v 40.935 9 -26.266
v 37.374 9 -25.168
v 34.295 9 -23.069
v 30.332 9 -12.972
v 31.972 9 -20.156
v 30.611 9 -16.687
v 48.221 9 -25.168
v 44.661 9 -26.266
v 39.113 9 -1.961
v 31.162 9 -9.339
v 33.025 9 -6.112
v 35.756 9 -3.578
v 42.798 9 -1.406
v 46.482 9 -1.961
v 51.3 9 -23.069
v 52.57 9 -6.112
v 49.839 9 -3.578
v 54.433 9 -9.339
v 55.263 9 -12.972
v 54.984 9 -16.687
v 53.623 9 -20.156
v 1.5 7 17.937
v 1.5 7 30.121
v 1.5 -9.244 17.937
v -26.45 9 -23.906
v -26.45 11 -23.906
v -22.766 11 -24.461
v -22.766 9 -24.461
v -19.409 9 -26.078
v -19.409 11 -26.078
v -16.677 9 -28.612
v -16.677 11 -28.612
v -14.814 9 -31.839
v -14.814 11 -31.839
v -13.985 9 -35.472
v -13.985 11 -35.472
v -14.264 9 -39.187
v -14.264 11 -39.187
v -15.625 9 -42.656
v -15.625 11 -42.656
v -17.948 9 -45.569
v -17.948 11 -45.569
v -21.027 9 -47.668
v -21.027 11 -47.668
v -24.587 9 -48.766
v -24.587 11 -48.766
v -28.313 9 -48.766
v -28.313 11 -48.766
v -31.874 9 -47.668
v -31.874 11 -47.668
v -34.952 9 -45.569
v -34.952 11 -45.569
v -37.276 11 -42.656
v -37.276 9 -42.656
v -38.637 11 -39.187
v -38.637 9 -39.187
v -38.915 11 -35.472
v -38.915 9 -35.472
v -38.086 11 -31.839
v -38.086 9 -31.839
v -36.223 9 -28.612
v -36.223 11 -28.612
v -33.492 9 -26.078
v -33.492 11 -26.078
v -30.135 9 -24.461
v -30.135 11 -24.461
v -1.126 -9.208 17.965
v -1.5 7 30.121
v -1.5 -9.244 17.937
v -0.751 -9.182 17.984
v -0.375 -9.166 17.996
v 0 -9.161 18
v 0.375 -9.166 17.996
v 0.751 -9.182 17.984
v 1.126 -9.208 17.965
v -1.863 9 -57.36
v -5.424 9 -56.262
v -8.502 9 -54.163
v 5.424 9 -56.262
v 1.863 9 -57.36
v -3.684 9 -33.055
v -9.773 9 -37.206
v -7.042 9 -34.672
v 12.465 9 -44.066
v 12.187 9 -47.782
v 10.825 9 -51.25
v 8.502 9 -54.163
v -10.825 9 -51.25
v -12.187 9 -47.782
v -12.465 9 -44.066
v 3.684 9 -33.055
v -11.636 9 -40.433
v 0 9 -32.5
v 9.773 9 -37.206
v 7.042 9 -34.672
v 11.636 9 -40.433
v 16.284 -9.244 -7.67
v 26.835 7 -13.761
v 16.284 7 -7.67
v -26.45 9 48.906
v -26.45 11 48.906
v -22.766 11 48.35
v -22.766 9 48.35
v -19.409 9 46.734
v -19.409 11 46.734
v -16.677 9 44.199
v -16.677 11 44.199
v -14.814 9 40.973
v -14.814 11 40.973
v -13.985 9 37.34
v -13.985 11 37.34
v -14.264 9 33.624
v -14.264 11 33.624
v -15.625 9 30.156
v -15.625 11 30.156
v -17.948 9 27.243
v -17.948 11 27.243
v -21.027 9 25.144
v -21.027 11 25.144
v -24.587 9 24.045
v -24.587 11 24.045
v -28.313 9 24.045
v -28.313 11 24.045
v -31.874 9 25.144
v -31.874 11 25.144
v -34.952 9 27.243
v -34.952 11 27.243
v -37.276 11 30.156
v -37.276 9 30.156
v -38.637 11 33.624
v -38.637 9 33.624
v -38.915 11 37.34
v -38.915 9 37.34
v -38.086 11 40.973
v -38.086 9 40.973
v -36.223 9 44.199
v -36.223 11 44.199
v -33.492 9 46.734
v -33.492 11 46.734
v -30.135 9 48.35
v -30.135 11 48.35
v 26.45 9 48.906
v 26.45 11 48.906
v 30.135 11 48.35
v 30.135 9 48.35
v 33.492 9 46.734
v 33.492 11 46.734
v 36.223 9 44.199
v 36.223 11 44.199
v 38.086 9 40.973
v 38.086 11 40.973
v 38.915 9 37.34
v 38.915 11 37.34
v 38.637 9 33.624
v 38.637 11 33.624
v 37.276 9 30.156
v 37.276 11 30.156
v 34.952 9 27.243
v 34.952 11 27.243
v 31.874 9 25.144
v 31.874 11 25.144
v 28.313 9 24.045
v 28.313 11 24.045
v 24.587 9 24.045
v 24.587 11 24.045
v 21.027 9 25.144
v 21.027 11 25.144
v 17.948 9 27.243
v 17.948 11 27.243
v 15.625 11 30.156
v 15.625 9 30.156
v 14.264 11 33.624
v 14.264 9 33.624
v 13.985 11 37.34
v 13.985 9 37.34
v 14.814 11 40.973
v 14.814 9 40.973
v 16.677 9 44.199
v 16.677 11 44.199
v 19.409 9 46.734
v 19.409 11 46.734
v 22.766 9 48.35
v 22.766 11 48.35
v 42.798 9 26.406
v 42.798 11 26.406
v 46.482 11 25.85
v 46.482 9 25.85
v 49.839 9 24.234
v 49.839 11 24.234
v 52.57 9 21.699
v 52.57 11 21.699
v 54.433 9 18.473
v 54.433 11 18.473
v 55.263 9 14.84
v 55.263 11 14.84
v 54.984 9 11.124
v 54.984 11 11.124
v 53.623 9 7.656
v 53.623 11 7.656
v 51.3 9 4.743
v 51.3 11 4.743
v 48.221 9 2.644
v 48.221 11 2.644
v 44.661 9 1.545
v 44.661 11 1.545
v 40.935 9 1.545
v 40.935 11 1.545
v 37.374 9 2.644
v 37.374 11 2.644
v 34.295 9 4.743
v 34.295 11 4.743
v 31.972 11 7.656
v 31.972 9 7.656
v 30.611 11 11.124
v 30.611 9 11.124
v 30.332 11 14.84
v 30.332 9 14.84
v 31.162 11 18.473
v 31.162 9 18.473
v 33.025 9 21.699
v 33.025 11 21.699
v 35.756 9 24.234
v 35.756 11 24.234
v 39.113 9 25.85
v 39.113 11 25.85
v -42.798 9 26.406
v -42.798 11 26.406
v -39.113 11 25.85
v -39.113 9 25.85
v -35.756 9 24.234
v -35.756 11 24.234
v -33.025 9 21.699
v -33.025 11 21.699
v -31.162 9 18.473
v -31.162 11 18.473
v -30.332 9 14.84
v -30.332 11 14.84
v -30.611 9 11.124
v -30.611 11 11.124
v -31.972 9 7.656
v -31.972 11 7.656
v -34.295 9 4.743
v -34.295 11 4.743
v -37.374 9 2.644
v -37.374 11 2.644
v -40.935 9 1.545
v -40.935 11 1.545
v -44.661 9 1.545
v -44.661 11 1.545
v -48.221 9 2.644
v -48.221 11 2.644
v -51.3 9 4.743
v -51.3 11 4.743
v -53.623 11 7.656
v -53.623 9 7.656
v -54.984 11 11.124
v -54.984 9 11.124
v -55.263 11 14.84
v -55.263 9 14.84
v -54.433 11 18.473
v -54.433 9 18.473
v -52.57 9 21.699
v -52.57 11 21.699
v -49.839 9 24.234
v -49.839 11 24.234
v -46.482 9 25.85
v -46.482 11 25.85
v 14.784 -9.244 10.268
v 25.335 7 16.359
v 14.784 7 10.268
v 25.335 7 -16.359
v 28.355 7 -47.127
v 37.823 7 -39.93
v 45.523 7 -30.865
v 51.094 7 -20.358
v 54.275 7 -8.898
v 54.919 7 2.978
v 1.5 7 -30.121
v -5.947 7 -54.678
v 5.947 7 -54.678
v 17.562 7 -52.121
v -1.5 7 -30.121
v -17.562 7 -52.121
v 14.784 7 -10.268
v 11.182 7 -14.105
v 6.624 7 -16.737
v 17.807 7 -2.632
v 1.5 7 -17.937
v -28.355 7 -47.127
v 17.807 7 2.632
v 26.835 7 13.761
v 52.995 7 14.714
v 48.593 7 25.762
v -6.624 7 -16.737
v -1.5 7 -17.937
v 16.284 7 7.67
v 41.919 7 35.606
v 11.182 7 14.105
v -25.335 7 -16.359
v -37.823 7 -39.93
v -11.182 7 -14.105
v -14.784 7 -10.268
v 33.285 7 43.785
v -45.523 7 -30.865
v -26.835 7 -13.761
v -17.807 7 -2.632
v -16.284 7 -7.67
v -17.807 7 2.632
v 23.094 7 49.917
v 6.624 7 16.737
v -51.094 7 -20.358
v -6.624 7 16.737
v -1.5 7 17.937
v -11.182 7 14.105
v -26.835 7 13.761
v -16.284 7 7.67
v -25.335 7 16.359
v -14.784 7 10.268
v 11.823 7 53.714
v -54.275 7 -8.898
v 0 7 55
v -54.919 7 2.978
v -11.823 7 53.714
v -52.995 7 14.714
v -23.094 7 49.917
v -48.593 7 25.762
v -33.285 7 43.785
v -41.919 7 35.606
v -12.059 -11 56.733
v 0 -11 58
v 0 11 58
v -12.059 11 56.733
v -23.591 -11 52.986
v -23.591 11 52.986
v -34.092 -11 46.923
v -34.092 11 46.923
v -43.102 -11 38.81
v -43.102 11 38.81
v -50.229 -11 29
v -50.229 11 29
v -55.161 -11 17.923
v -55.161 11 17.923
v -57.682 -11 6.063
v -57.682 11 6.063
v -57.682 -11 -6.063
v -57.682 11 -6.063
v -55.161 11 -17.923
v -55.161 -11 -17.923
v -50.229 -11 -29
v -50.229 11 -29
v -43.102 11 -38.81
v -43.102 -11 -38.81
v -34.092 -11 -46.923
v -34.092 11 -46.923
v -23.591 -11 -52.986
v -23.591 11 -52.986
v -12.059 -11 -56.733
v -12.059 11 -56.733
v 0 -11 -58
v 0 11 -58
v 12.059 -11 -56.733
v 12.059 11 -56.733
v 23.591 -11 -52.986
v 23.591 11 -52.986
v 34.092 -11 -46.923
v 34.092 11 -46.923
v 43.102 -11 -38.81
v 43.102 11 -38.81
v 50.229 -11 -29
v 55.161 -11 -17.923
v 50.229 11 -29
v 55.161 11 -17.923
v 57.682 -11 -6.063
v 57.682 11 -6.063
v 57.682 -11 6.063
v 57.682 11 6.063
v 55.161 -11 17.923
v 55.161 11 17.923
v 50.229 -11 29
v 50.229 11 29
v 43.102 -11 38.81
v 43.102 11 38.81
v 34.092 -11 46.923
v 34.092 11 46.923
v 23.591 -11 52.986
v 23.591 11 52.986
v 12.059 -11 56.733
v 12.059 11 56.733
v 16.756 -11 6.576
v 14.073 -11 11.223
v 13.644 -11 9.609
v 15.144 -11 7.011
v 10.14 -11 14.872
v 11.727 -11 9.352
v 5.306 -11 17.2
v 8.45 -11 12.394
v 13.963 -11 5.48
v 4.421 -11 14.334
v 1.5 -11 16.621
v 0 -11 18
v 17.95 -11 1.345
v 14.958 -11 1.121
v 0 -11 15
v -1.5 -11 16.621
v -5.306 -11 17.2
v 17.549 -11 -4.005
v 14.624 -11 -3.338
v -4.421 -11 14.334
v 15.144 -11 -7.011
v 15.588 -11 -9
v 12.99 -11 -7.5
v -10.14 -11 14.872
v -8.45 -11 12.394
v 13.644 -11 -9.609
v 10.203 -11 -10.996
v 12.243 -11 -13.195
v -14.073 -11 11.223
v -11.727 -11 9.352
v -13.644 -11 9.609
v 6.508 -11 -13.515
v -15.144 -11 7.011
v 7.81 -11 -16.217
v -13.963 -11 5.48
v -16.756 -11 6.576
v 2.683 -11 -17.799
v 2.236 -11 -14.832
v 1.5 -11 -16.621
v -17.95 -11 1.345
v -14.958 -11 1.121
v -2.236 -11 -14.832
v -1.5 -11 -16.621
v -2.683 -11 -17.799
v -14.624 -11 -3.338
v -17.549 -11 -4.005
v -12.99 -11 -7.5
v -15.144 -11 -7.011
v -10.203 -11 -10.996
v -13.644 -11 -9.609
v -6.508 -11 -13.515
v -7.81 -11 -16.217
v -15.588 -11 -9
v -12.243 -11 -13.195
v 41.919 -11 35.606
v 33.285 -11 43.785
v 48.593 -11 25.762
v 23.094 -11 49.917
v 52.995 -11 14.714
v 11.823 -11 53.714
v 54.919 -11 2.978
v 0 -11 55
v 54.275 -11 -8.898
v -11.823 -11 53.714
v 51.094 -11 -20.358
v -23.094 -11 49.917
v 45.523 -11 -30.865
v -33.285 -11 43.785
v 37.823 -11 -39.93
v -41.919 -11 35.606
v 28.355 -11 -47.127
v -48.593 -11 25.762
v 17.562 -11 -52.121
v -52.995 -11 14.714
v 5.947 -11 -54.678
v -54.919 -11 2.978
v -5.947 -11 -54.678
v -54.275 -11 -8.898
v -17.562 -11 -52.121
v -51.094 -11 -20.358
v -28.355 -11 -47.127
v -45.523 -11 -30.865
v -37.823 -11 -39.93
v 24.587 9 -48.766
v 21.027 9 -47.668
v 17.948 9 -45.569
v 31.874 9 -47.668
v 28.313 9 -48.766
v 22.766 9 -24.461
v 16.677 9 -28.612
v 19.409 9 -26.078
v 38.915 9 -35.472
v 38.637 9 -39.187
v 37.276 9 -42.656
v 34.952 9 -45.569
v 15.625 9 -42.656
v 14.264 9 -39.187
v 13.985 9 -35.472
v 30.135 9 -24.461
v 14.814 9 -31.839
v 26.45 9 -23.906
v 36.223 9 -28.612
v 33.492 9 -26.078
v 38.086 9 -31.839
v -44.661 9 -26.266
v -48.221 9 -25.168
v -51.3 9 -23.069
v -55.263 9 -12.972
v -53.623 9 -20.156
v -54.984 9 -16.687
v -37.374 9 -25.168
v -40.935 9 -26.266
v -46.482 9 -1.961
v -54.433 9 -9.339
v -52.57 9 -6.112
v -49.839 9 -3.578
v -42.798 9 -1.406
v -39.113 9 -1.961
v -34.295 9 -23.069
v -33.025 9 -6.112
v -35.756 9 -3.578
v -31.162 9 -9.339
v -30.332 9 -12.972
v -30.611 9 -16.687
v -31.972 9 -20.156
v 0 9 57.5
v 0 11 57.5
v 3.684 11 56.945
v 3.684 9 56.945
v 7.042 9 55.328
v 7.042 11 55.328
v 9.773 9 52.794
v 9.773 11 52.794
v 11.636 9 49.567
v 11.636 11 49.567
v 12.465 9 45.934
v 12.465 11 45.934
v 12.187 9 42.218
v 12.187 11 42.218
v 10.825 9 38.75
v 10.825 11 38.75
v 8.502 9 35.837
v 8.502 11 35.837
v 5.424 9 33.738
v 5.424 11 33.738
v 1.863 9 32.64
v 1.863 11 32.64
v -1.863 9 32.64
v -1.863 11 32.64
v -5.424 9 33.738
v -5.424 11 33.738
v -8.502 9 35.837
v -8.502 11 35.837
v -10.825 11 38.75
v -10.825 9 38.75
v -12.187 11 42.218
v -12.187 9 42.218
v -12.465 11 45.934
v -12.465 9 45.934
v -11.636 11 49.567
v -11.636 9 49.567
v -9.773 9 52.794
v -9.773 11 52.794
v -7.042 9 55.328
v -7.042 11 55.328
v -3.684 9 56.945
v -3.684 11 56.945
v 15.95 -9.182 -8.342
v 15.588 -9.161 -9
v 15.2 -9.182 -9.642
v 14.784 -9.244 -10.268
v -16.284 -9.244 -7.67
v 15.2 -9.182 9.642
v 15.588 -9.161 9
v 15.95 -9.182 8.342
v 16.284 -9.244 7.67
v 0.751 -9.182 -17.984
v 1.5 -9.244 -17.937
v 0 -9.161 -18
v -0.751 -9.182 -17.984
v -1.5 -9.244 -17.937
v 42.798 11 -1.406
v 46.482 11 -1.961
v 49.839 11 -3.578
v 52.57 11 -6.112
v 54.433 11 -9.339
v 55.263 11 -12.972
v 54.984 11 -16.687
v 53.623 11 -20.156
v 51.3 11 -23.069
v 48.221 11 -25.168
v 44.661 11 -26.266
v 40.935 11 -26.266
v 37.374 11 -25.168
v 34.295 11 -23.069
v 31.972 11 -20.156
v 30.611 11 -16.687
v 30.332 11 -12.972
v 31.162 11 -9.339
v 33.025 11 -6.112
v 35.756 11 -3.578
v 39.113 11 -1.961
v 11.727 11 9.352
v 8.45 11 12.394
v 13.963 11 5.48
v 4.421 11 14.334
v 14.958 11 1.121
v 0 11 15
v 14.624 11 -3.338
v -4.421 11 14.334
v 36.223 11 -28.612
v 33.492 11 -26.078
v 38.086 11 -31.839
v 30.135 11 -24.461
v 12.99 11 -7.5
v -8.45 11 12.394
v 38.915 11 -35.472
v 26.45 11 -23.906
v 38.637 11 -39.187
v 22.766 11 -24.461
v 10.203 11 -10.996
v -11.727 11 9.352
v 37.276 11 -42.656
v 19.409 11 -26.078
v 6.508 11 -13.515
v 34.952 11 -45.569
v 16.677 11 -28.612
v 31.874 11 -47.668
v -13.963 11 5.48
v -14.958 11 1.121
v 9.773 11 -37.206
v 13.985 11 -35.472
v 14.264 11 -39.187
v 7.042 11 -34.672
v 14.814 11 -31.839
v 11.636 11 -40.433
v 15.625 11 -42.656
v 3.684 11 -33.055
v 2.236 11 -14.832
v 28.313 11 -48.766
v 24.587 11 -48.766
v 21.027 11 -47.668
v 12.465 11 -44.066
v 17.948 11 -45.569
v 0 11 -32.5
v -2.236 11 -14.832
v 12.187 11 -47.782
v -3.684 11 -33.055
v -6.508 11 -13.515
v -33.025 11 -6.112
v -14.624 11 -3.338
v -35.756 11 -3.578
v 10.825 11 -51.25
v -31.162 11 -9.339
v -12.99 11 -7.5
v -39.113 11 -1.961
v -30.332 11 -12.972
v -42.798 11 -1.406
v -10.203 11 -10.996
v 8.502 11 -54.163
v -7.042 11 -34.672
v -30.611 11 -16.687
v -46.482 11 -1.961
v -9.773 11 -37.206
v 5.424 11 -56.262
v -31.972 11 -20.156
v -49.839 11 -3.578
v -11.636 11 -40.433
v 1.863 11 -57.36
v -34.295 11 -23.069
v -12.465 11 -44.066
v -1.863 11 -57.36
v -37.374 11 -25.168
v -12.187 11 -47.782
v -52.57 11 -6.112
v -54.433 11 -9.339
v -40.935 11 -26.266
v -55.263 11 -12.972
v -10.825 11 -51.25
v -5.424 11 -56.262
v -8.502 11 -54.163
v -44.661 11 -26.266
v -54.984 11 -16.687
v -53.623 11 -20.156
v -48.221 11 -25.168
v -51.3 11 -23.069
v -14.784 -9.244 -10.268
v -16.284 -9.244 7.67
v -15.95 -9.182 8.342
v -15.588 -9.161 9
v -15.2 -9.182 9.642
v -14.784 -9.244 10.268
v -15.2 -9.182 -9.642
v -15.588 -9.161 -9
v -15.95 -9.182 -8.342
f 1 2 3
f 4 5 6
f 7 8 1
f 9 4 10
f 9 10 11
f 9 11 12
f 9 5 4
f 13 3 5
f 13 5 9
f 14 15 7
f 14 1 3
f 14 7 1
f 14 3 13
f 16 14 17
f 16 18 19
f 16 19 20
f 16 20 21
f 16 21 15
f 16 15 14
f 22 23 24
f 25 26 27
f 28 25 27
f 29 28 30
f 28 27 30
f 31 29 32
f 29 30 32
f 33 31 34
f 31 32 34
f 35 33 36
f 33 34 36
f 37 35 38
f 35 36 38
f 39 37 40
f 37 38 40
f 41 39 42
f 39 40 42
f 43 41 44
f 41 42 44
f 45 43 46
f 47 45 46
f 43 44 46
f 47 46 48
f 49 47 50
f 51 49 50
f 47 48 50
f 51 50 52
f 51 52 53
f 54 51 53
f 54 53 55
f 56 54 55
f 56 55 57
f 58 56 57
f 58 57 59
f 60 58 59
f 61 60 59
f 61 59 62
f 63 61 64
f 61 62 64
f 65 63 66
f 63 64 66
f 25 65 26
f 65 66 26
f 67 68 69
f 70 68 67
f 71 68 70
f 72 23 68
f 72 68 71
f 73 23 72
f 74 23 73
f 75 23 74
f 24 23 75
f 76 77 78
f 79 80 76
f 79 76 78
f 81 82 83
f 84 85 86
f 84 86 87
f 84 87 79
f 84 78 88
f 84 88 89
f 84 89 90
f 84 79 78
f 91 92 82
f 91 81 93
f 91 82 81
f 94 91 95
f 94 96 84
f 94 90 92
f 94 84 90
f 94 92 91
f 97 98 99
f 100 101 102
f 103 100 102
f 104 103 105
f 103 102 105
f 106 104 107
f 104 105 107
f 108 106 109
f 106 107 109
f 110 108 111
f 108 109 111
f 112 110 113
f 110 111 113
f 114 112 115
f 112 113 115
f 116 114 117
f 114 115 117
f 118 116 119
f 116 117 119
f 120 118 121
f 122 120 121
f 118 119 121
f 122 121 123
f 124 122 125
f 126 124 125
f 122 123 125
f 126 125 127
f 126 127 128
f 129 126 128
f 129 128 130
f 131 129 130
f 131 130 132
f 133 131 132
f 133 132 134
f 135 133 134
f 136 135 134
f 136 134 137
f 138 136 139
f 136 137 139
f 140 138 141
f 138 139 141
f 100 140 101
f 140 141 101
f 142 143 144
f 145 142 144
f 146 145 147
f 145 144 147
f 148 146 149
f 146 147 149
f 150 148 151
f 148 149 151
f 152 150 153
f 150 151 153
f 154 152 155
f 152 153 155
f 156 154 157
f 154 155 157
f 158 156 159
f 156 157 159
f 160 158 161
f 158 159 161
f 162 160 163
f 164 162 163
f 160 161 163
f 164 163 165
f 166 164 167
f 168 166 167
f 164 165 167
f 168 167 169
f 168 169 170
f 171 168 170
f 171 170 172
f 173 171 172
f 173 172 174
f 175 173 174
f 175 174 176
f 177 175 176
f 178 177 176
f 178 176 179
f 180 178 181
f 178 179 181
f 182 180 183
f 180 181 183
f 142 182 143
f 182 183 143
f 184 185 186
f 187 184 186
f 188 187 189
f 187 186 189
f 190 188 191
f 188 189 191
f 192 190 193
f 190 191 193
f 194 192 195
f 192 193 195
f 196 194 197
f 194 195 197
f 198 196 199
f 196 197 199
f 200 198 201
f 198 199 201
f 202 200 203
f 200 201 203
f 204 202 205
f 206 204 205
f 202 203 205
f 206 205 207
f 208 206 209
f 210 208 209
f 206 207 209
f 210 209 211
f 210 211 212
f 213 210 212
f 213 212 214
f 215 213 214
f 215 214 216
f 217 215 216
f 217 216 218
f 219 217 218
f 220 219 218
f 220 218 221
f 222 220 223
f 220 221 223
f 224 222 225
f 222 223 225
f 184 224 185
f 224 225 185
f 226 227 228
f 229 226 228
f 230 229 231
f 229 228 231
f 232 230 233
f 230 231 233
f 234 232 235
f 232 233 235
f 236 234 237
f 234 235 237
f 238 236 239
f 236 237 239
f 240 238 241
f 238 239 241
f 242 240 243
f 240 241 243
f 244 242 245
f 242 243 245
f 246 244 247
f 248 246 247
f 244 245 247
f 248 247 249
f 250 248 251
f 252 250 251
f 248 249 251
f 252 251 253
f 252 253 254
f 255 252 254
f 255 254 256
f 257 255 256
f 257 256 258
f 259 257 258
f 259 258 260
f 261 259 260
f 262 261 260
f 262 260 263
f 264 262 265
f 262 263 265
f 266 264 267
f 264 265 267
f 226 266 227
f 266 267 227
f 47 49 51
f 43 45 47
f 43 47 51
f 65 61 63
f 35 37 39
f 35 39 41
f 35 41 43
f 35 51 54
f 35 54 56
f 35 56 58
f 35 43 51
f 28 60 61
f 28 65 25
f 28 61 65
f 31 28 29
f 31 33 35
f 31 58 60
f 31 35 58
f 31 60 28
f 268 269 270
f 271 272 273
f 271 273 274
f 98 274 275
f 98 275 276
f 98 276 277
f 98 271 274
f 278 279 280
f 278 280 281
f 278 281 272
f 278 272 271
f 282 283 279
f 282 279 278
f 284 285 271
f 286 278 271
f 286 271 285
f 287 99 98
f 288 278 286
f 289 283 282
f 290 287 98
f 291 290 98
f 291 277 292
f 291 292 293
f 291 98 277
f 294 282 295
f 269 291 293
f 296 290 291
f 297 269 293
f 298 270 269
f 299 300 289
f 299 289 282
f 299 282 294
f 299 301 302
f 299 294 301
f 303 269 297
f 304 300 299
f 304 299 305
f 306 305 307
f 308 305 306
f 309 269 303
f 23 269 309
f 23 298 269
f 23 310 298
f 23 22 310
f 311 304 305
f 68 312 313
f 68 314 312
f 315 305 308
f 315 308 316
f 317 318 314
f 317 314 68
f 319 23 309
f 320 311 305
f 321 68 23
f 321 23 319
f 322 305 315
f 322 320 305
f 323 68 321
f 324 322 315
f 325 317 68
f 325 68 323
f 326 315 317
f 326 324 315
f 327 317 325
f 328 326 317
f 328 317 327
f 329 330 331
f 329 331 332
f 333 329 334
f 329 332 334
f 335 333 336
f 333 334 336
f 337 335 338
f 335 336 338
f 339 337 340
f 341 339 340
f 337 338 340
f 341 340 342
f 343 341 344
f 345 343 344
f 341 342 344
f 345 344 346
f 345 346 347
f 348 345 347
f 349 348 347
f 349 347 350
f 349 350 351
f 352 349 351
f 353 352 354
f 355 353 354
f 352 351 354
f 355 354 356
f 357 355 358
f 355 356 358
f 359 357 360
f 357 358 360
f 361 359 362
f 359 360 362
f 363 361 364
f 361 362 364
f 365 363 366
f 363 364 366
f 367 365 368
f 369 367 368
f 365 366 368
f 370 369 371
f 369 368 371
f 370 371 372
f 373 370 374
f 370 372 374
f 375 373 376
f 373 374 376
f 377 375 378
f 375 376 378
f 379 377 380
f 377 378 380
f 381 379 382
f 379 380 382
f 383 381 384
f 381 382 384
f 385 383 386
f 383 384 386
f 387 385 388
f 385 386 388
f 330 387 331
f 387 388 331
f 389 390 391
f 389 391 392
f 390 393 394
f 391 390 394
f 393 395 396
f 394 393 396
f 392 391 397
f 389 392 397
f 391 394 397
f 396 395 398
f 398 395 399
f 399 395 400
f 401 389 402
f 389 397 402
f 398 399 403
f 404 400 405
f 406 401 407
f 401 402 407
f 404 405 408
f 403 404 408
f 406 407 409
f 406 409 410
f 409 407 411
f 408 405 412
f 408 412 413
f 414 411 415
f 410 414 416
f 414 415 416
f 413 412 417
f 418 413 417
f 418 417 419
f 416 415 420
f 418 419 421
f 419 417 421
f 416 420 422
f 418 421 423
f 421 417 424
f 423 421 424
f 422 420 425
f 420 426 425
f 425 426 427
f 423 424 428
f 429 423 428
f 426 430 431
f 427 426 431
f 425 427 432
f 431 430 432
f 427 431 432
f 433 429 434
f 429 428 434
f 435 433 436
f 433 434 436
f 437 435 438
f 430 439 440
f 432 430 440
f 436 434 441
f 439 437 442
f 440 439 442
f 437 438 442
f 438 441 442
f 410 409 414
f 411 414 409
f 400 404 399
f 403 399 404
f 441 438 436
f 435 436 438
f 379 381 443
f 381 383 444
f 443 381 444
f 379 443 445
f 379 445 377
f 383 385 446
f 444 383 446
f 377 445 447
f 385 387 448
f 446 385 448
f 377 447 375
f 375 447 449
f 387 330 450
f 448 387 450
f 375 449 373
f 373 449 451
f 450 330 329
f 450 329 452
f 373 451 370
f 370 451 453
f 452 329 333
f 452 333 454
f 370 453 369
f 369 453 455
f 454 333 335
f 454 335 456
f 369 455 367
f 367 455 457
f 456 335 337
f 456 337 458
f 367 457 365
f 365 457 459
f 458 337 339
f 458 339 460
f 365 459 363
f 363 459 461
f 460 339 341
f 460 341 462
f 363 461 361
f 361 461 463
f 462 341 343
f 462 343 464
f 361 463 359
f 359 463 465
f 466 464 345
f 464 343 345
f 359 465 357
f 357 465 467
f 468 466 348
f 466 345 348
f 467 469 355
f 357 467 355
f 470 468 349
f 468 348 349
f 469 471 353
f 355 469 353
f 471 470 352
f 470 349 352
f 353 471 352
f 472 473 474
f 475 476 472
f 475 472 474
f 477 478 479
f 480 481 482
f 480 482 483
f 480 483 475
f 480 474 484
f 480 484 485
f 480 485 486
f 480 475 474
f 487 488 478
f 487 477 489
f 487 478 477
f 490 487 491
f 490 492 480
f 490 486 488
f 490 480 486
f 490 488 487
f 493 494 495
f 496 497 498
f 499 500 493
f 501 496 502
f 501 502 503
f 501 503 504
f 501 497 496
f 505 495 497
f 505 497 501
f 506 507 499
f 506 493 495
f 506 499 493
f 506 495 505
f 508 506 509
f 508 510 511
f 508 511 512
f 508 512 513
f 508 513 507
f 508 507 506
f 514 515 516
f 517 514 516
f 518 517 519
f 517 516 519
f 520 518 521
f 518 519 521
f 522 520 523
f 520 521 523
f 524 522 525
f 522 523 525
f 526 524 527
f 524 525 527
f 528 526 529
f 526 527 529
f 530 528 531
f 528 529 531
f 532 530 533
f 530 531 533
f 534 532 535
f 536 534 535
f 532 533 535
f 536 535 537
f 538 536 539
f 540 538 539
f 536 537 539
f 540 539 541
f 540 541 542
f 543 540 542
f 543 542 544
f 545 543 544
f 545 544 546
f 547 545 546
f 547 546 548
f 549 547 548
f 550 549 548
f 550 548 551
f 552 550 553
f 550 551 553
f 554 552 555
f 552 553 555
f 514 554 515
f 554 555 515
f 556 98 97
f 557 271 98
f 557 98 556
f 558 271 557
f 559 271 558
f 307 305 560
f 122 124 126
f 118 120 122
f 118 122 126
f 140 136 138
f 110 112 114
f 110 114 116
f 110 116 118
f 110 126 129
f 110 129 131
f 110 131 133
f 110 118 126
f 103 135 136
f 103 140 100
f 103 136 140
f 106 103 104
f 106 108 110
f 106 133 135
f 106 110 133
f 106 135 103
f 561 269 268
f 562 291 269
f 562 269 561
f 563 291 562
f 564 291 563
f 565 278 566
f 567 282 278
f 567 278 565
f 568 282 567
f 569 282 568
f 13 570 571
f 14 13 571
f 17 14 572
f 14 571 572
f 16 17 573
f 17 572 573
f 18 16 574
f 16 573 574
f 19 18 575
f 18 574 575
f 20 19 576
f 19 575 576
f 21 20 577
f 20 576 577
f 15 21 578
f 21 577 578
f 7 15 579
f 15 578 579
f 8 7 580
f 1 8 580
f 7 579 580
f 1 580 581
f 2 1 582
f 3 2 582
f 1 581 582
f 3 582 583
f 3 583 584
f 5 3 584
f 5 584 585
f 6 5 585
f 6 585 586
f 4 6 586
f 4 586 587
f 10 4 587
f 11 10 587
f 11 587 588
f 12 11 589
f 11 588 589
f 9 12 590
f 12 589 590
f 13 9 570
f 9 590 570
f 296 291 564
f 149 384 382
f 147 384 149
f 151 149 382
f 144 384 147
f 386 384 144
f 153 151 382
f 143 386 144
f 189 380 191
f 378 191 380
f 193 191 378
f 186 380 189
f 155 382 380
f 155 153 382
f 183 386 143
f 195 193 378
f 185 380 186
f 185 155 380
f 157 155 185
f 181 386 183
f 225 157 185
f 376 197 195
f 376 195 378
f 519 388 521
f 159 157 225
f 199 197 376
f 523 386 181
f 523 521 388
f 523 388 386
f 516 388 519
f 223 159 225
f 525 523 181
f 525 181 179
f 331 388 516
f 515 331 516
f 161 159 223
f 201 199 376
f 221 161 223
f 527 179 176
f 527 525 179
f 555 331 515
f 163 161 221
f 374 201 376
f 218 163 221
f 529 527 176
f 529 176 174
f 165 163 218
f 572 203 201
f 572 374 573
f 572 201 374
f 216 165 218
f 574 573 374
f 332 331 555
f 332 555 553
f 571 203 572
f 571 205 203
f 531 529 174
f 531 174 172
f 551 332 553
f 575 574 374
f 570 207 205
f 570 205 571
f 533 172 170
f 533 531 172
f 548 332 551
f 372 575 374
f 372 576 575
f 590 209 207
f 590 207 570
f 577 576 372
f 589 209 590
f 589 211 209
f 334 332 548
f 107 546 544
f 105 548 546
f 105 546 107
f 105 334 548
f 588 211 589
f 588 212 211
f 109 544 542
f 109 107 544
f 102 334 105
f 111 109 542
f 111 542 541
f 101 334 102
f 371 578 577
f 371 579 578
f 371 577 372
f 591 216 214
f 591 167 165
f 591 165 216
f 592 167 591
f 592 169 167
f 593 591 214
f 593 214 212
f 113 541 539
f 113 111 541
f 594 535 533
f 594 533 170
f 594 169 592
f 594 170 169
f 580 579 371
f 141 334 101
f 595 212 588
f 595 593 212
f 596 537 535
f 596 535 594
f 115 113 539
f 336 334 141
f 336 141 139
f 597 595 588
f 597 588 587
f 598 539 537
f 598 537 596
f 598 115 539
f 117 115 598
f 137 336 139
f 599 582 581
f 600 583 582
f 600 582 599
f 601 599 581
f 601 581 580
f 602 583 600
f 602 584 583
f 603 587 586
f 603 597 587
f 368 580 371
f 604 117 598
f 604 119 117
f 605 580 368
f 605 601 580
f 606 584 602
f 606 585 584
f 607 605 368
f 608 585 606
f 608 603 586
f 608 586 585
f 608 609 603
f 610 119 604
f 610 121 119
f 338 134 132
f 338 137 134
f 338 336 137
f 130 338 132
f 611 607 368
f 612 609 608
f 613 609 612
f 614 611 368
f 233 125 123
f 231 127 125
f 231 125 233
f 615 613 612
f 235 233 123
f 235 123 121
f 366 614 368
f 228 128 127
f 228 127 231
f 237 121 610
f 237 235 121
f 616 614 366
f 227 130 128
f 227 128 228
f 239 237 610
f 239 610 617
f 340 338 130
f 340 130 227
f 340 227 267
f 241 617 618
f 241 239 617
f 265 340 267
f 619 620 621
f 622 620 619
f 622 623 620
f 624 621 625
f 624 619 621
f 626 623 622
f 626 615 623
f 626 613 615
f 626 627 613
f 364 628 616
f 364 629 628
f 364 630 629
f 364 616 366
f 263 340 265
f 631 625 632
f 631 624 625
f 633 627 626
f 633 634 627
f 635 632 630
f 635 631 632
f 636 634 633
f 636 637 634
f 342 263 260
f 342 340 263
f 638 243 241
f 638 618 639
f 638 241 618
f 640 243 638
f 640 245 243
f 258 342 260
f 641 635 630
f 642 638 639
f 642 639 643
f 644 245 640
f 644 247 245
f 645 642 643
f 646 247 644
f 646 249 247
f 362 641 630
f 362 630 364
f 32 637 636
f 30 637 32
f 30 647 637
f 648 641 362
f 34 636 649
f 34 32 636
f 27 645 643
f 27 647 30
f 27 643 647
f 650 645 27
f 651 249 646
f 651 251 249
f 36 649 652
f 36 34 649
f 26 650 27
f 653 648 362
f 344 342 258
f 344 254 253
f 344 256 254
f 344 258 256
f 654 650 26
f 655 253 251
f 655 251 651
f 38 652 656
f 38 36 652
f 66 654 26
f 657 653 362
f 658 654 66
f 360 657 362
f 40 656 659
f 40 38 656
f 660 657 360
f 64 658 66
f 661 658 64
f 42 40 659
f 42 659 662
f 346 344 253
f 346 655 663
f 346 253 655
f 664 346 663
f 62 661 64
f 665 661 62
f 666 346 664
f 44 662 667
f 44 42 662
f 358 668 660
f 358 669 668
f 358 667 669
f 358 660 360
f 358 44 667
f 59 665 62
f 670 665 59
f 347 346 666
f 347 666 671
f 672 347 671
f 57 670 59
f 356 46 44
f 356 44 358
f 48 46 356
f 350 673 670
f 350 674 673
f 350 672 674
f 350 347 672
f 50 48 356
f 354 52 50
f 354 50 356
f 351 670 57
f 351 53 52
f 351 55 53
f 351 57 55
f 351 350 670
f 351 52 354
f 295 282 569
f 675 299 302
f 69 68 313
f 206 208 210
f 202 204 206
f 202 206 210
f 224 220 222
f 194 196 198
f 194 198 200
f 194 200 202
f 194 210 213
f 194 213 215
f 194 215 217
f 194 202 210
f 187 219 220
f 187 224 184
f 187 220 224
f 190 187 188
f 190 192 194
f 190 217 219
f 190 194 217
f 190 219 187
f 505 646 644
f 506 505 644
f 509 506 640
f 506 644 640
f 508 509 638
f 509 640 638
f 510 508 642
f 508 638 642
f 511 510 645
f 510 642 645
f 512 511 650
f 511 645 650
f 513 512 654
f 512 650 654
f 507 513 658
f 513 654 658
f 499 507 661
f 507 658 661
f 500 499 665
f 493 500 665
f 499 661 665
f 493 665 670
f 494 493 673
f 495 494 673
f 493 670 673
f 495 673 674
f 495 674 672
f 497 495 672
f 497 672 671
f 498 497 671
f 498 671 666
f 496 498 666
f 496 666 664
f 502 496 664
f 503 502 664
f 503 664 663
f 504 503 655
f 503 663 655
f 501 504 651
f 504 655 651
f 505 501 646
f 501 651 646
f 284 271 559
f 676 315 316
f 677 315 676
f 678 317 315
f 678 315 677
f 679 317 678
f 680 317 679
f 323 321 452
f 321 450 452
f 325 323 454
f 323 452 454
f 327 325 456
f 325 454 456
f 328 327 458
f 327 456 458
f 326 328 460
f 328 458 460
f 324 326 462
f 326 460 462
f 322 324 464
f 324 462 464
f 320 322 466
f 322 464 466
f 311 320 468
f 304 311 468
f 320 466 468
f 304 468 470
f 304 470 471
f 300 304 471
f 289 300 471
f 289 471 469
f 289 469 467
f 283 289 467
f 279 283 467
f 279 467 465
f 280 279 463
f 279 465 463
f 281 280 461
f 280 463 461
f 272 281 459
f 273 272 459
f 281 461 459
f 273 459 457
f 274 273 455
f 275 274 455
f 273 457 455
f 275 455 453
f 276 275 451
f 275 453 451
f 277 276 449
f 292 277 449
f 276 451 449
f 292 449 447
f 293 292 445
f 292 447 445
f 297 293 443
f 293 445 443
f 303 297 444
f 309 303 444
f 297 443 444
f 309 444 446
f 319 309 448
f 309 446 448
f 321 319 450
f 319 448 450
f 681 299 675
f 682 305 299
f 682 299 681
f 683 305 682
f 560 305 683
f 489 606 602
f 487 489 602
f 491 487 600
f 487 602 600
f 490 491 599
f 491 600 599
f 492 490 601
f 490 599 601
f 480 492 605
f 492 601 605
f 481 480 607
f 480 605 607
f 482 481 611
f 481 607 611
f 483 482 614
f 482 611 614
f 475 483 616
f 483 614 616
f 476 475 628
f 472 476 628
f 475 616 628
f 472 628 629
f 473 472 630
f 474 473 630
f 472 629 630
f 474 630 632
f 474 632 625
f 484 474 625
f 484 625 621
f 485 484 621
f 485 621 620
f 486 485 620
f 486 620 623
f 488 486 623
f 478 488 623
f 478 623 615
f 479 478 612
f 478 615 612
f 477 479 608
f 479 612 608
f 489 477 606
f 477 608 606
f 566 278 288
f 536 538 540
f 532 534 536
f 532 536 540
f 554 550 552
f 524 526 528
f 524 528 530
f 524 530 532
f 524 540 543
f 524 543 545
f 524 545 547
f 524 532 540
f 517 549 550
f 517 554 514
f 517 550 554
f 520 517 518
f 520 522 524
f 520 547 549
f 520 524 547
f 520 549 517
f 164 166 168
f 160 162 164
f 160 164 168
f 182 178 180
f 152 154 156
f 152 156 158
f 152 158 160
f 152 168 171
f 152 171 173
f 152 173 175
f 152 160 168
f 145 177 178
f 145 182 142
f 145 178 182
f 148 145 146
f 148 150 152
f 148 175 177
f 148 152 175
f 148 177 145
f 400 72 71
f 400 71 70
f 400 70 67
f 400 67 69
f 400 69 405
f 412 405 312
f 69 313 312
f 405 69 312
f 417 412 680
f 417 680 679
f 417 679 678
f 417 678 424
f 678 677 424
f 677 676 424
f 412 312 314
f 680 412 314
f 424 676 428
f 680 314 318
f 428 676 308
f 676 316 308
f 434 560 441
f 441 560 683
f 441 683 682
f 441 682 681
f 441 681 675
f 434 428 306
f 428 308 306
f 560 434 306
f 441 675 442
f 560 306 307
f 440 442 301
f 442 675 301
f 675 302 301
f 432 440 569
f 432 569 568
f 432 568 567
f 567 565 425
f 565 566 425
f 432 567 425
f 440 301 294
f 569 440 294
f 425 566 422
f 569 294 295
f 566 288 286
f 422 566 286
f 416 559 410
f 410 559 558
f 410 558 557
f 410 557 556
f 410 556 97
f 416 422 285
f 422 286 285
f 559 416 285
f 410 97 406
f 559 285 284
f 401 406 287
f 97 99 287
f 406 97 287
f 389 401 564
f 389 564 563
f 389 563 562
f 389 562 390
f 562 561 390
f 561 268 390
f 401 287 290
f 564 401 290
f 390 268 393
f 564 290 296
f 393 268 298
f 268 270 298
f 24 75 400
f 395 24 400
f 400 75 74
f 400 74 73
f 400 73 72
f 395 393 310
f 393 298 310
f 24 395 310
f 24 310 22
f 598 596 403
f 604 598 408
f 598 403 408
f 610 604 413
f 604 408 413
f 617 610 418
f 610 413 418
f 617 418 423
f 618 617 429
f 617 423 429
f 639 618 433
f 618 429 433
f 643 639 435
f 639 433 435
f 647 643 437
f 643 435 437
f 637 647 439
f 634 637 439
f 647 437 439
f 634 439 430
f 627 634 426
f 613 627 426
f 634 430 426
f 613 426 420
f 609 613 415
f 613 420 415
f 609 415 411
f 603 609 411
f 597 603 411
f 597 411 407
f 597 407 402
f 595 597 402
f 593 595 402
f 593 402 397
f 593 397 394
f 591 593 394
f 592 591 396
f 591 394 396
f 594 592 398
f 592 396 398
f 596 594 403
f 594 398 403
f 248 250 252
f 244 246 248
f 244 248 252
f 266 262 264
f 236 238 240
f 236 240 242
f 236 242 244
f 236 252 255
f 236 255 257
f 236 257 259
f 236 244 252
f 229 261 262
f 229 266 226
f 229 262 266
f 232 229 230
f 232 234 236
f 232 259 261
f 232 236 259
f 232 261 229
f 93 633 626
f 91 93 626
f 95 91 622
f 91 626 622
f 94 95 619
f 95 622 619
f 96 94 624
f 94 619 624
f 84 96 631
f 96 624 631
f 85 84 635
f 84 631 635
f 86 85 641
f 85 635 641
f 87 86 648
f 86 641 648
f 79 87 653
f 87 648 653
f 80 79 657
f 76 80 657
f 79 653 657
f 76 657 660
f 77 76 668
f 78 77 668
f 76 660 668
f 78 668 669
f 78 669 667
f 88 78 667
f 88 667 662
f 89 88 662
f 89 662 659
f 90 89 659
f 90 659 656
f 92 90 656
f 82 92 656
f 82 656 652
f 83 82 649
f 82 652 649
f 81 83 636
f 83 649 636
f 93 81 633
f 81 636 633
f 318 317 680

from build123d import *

# Parameters (mm, degrees)
SKETCH2_R           = 12.5
CUT_EXTRUDE1_DEPTH  = 2
BOSS_EXTRUDE1_DEPTH = 1.5
CIRPATTERN1_COUNT   = 6


with BuildPart() as part:
    # Sketch1 → Revolve1 (revolve)
    with BuildSketch(Plane(origin=(0, 0, 0), x_dir=(0, 0, -1), z_dir=(1, 0, 0))):
        Polygon((-45, 11), (-15, 11), (-15, -11), (-18, -11), (-18, 7), (-45, 7), (-55, 7), (-55, -11), (-58, -11), (-58, 11), align=None)
    revolve(axis=Axis((0, 42.640170011, 0), (0, -1, 0)))

    # Sketch2 → Cut-Extrude1 (cut)
    with BuildSketch(Plane(origin=(0, 11, 0), x_dir=(1, 0, 0), z_dir=(0, 1, 0))):
        with Locations(Location((0, 45, 0), (0, 0, 270))):
            Circle(SKETCH2_R)
        with Locations(Location((26.450336353, 36.405764747, 0), (0, 0, 270))):
            Circle(SKETCH2_R)
        with Locations(Location((42.797543233, 13.905764747, 0), (0, 0, 270))):
            Circle(SKETCH2_R)
        with Locations(Location((42.797543233, -13.905764747, 0), (0, 0, 270))):
            Circle(SKETCH2_R)
        with Locations(Location((26.450336353, -36.405764747, 0), (0, 0, 270))):
            Circle(SKETCH2_R)
        with Locations(Location((0, -45, 0), (0, 0, 270))):
            Circle(SKETCH2_R)
        with Locations(Location((-26.450336353, -36.405764747, 0), (0, 0, 270))):
            Circle(SKETCH2_R)
        with Locations(Location((-42.797543233, -13.905764747, 0), (0, 0, 270))):
            Circle(SKETCH2_R)
        with Locations(Location((-42.797543233, 13.905764747, 0), (0, 0, 270))):
            Circle(SKETCH2_R)
        with Locations(Location((-26.450336353, 36.405764747, 0), (0, 0, 270))):
            Circle(SKETCH2_R)
    extrude(amount=-CUT_EXTRUDE1_DEPTH, mode=Mode.SUBTRACT)

    # Sketch3 → Boss-Extrude1 (add, symmetric)
    with BuildSketch(Plane(origin=(0, 0, 0), x_dir=(0, 0, -1), z_dir=(1, 0, 0))):
        Polygon((-16.62069533, -11), (-16.62069533, 9), (-31.62069533, 9), align=None)
    boss_extrude1 = extrude(amount=BOSS_EXTRUDE1_DEPTH, both=True)

    # CirPattern1: Boss-Extrude1 ×6 about axis
    cirpattern1_axis = Axis((0, 0, 0), (0, 1, 0))
    for i in range(1, CIRPATTERN1_COUNT):
        add(boss_extrude1.rotate(cirpattern1_axis, i * 360 / CIRPATTERN1_COUNT))


solid = part.part
